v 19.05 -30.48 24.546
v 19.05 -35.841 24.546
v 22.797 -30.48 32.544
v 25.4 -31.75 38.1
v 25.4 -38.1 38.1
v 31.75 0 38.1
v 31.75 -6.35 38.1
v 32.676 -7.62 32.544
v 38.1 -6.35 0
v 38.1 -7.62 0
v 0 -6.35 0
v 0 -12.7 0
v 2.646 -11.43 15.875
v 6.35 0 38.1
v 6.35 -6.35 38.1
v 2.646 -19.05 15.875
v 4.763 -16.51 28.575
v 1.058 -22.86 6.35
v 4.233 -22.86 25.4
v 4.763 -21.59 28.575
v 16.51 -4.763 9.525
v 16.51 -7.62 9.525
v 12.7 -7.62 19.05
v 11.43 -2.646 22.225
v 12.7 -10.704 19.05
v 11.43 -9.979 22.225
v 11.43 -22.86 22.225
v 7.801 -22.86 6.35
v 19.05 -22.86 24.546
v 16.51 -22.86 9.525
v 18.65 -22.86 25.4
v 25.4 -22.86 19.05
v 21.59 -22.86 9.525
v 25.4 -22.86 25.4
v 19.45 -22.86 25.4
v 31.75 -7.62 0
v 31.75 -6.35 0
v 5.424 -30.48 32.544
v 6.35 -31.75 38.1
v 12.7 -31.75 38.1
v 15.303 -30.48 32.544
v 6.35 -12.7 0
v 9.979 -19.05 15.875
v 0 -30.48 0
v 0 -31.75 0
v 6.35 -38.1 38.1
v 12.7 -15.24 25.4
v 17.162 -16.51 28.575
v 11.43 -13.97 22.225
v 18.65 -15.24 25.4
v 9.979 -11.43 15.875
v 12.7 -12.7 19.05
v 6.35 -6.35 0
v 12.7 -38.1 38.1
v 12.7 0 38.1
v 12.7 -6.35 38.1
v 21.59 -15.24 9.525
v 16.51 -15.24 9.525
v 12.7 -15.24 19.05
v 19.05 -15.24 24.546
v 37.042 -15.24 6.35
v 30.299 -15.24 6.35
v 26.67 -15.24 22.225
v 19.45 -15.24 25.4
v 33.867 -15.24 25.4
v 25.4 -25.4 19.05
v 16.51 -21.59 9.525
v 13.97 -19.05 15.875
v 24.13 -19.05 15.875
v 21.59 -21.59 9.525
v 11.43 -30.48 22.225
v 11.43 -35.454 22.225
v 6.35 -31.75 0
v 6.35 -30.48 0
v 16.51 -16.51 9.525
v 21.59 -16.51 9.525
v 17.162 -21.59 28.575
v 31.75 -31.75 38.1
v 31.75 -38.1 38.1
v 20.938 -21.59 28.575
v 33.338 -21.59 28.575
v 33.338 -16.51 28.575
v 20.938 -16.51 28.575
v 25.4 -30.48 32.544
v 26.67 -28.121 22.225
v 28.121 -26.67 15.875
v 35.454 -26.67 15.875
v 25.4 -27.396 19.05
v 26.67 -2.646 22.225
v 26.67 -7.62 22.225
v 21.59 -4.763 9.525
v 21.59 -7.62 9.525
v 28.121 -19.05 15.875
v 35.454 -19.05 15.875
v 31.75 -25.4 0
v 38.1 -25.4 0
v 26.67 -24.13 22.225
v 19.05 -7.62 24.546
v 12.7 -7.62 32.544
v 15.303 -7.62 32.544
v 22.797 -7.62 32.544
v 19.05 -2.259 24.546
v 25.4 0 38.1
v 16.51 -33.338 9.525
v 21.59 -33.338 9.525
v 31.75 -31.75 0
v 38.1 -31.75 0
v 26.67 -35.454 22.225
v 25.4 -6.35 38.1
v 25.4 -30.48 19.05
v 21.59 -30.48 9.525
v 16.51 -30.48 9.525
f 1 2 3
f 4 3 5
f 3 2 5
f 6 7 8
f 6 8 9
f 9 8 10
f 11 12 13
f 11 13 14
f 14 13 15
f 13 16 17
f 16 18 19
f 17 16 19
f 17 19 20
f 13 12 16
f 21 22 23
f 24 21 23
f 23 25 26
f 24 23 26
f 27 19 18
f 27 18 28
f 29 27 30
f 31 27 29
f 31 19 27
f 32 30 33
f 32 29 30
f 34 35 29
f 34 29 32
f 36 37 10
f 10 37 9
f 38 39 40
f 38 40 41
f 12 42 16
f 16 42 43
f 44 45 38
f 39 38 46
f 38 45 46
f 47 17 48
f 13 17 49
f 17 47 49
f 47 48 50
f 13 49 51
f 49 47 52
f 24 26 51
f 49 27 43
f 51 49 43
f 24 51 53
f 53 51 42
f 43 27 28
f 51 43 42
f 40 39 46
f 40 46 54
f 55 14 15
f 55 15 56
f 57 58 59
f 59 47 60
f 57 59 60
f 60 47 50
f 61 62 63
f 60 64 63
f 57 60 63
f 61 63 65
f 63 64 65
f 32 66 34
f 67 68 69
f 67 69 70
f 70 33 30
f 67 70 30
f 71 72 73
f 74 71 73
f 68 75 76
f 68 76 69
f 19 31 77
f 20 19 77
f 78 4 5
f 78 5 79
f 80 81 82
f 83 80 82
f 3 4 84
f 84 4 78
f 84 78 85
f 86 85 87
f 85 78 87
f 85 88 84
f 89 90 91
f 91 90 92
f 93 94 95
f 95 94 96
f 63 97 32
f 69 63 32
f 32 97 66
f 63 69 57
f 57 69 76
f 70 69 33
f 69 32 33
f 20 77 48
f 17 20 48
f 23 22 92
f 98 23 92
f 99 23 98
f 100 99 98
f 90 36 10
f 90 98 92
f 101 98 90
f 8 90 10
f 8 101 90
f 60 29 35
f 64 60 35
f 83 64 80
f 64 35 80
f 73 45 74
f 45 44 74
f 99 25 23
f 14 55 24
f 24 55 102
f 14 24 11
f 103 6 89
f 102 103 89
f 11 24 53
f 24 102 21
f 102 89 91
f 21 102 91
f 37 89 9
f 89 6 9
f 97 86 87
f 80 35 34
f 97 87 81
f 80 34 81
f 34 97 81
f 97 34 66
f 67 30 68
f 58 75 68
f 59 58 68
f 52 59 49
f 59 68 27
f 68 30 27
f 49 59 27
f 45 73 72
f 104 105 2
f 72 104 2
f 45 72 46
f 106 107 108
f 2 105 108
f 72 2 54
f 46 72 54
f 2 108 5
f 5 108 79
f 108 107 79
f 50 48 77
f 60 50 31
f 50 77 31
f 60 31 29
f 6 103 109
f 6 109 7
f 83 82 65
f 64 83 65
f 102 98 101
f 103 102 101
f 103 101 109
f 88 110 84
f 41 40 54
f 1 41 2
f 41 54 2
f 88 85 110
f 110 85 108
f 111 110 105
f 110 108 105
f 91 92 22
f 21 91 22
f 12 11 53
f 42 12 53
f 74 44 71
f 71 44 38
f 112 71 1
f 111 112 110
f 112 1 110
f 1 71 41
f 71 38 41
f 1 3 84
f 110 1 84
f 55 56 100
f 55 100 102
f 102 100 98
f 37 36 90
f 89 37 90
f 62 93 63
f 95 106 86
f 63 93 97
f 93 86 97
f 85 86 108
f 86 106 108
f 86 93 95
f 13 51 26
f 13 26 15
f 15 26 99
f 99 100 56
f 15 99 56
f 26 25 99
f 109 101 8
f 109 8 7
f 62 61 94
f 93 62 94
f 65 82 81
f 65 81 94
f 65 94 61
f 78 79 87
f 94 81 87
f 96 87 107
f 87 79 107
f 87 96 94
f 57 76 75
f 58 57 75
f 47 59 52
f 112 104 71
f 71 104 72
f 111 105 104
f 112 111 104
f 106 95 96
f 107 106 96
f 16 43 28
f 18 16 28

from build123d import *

# Parameters (mm, degrees)
F0_W      = 38.1
F0_H      = 38.1
F1_DEPTH  = 38.1
F6_DEPTH  = 38.1
F8_DEPTH  = 38.1
F9_W      = 25.4
F9_H      = 7.62
F10_DEPTH = 38.1


with BuildPart() as f1:
    # F0 (on Front) → F1 (new body)
    with BuildSketch(Plane.XZ):
        with Locations((19.05, 19.05)):
            Rectangle(F0_W, F0_H)
    extrude(amount=F1_DEPTH)

    # F5 (on offset) → F6 (cut)
    with BuildSketch(Plane.YZ.offset(38.1)):
        Polygon((-11.43, 15.875), (-6.35, 38.1), (-31.75, 38.1), (-26.67, 15.875), (-21.59, 28.575), (-16.51, 28.575), align=None)
        Polygon((-31.75, 0), (-38.1, 38.1), (-38.1, 0), align=None)
        Polygon((-6.35, 0), (0, 0), (0, 38.1), align=None)
        Polygon((-25.4, 0), (-12.7, 0), (-19.05, 15.875), align=None)
    extrude(amount=-F6_DEPTH, mode=Mode.SUBTRACT)

    # F7 (on offset) → F8 (cut)
    with BuildSketch(Plane.XZ.offset(38.1)):
        Polygon((25.4, 38.1), (12.7, 38.1), (19.05, 24.545955), align=None)
        Polygon((11.43, 22.225), (6.35, 0), (31.75, 0), (26.67, 22.225), (21.59, 9.525), (16.51, 9.525), align=None)
        Polygon((31.75, 38.1), (38.1, 0), (38.1, 38.1), align=None)
        Polygon((0, 38.1), (0, 0), (6.35, 38.1), align=None)
    extrude(amount=-F8_DEPTH, mode=Mode.SUBTRACT)

    # F9 (on offset) → F10 (cut)
    with BuildSketch(Plane.XY.offset(38.1)):
        with Locations((25.4, -11.43)):
            Rectangle(F9_W, F9_H)
        with Locations((12.7, -26.67)):
            Rectangle(F9_W, F9_H)
    extrude(amount=-F10_DEPTH, mode=Mode.SUBTRACT)


solid = f1.part
